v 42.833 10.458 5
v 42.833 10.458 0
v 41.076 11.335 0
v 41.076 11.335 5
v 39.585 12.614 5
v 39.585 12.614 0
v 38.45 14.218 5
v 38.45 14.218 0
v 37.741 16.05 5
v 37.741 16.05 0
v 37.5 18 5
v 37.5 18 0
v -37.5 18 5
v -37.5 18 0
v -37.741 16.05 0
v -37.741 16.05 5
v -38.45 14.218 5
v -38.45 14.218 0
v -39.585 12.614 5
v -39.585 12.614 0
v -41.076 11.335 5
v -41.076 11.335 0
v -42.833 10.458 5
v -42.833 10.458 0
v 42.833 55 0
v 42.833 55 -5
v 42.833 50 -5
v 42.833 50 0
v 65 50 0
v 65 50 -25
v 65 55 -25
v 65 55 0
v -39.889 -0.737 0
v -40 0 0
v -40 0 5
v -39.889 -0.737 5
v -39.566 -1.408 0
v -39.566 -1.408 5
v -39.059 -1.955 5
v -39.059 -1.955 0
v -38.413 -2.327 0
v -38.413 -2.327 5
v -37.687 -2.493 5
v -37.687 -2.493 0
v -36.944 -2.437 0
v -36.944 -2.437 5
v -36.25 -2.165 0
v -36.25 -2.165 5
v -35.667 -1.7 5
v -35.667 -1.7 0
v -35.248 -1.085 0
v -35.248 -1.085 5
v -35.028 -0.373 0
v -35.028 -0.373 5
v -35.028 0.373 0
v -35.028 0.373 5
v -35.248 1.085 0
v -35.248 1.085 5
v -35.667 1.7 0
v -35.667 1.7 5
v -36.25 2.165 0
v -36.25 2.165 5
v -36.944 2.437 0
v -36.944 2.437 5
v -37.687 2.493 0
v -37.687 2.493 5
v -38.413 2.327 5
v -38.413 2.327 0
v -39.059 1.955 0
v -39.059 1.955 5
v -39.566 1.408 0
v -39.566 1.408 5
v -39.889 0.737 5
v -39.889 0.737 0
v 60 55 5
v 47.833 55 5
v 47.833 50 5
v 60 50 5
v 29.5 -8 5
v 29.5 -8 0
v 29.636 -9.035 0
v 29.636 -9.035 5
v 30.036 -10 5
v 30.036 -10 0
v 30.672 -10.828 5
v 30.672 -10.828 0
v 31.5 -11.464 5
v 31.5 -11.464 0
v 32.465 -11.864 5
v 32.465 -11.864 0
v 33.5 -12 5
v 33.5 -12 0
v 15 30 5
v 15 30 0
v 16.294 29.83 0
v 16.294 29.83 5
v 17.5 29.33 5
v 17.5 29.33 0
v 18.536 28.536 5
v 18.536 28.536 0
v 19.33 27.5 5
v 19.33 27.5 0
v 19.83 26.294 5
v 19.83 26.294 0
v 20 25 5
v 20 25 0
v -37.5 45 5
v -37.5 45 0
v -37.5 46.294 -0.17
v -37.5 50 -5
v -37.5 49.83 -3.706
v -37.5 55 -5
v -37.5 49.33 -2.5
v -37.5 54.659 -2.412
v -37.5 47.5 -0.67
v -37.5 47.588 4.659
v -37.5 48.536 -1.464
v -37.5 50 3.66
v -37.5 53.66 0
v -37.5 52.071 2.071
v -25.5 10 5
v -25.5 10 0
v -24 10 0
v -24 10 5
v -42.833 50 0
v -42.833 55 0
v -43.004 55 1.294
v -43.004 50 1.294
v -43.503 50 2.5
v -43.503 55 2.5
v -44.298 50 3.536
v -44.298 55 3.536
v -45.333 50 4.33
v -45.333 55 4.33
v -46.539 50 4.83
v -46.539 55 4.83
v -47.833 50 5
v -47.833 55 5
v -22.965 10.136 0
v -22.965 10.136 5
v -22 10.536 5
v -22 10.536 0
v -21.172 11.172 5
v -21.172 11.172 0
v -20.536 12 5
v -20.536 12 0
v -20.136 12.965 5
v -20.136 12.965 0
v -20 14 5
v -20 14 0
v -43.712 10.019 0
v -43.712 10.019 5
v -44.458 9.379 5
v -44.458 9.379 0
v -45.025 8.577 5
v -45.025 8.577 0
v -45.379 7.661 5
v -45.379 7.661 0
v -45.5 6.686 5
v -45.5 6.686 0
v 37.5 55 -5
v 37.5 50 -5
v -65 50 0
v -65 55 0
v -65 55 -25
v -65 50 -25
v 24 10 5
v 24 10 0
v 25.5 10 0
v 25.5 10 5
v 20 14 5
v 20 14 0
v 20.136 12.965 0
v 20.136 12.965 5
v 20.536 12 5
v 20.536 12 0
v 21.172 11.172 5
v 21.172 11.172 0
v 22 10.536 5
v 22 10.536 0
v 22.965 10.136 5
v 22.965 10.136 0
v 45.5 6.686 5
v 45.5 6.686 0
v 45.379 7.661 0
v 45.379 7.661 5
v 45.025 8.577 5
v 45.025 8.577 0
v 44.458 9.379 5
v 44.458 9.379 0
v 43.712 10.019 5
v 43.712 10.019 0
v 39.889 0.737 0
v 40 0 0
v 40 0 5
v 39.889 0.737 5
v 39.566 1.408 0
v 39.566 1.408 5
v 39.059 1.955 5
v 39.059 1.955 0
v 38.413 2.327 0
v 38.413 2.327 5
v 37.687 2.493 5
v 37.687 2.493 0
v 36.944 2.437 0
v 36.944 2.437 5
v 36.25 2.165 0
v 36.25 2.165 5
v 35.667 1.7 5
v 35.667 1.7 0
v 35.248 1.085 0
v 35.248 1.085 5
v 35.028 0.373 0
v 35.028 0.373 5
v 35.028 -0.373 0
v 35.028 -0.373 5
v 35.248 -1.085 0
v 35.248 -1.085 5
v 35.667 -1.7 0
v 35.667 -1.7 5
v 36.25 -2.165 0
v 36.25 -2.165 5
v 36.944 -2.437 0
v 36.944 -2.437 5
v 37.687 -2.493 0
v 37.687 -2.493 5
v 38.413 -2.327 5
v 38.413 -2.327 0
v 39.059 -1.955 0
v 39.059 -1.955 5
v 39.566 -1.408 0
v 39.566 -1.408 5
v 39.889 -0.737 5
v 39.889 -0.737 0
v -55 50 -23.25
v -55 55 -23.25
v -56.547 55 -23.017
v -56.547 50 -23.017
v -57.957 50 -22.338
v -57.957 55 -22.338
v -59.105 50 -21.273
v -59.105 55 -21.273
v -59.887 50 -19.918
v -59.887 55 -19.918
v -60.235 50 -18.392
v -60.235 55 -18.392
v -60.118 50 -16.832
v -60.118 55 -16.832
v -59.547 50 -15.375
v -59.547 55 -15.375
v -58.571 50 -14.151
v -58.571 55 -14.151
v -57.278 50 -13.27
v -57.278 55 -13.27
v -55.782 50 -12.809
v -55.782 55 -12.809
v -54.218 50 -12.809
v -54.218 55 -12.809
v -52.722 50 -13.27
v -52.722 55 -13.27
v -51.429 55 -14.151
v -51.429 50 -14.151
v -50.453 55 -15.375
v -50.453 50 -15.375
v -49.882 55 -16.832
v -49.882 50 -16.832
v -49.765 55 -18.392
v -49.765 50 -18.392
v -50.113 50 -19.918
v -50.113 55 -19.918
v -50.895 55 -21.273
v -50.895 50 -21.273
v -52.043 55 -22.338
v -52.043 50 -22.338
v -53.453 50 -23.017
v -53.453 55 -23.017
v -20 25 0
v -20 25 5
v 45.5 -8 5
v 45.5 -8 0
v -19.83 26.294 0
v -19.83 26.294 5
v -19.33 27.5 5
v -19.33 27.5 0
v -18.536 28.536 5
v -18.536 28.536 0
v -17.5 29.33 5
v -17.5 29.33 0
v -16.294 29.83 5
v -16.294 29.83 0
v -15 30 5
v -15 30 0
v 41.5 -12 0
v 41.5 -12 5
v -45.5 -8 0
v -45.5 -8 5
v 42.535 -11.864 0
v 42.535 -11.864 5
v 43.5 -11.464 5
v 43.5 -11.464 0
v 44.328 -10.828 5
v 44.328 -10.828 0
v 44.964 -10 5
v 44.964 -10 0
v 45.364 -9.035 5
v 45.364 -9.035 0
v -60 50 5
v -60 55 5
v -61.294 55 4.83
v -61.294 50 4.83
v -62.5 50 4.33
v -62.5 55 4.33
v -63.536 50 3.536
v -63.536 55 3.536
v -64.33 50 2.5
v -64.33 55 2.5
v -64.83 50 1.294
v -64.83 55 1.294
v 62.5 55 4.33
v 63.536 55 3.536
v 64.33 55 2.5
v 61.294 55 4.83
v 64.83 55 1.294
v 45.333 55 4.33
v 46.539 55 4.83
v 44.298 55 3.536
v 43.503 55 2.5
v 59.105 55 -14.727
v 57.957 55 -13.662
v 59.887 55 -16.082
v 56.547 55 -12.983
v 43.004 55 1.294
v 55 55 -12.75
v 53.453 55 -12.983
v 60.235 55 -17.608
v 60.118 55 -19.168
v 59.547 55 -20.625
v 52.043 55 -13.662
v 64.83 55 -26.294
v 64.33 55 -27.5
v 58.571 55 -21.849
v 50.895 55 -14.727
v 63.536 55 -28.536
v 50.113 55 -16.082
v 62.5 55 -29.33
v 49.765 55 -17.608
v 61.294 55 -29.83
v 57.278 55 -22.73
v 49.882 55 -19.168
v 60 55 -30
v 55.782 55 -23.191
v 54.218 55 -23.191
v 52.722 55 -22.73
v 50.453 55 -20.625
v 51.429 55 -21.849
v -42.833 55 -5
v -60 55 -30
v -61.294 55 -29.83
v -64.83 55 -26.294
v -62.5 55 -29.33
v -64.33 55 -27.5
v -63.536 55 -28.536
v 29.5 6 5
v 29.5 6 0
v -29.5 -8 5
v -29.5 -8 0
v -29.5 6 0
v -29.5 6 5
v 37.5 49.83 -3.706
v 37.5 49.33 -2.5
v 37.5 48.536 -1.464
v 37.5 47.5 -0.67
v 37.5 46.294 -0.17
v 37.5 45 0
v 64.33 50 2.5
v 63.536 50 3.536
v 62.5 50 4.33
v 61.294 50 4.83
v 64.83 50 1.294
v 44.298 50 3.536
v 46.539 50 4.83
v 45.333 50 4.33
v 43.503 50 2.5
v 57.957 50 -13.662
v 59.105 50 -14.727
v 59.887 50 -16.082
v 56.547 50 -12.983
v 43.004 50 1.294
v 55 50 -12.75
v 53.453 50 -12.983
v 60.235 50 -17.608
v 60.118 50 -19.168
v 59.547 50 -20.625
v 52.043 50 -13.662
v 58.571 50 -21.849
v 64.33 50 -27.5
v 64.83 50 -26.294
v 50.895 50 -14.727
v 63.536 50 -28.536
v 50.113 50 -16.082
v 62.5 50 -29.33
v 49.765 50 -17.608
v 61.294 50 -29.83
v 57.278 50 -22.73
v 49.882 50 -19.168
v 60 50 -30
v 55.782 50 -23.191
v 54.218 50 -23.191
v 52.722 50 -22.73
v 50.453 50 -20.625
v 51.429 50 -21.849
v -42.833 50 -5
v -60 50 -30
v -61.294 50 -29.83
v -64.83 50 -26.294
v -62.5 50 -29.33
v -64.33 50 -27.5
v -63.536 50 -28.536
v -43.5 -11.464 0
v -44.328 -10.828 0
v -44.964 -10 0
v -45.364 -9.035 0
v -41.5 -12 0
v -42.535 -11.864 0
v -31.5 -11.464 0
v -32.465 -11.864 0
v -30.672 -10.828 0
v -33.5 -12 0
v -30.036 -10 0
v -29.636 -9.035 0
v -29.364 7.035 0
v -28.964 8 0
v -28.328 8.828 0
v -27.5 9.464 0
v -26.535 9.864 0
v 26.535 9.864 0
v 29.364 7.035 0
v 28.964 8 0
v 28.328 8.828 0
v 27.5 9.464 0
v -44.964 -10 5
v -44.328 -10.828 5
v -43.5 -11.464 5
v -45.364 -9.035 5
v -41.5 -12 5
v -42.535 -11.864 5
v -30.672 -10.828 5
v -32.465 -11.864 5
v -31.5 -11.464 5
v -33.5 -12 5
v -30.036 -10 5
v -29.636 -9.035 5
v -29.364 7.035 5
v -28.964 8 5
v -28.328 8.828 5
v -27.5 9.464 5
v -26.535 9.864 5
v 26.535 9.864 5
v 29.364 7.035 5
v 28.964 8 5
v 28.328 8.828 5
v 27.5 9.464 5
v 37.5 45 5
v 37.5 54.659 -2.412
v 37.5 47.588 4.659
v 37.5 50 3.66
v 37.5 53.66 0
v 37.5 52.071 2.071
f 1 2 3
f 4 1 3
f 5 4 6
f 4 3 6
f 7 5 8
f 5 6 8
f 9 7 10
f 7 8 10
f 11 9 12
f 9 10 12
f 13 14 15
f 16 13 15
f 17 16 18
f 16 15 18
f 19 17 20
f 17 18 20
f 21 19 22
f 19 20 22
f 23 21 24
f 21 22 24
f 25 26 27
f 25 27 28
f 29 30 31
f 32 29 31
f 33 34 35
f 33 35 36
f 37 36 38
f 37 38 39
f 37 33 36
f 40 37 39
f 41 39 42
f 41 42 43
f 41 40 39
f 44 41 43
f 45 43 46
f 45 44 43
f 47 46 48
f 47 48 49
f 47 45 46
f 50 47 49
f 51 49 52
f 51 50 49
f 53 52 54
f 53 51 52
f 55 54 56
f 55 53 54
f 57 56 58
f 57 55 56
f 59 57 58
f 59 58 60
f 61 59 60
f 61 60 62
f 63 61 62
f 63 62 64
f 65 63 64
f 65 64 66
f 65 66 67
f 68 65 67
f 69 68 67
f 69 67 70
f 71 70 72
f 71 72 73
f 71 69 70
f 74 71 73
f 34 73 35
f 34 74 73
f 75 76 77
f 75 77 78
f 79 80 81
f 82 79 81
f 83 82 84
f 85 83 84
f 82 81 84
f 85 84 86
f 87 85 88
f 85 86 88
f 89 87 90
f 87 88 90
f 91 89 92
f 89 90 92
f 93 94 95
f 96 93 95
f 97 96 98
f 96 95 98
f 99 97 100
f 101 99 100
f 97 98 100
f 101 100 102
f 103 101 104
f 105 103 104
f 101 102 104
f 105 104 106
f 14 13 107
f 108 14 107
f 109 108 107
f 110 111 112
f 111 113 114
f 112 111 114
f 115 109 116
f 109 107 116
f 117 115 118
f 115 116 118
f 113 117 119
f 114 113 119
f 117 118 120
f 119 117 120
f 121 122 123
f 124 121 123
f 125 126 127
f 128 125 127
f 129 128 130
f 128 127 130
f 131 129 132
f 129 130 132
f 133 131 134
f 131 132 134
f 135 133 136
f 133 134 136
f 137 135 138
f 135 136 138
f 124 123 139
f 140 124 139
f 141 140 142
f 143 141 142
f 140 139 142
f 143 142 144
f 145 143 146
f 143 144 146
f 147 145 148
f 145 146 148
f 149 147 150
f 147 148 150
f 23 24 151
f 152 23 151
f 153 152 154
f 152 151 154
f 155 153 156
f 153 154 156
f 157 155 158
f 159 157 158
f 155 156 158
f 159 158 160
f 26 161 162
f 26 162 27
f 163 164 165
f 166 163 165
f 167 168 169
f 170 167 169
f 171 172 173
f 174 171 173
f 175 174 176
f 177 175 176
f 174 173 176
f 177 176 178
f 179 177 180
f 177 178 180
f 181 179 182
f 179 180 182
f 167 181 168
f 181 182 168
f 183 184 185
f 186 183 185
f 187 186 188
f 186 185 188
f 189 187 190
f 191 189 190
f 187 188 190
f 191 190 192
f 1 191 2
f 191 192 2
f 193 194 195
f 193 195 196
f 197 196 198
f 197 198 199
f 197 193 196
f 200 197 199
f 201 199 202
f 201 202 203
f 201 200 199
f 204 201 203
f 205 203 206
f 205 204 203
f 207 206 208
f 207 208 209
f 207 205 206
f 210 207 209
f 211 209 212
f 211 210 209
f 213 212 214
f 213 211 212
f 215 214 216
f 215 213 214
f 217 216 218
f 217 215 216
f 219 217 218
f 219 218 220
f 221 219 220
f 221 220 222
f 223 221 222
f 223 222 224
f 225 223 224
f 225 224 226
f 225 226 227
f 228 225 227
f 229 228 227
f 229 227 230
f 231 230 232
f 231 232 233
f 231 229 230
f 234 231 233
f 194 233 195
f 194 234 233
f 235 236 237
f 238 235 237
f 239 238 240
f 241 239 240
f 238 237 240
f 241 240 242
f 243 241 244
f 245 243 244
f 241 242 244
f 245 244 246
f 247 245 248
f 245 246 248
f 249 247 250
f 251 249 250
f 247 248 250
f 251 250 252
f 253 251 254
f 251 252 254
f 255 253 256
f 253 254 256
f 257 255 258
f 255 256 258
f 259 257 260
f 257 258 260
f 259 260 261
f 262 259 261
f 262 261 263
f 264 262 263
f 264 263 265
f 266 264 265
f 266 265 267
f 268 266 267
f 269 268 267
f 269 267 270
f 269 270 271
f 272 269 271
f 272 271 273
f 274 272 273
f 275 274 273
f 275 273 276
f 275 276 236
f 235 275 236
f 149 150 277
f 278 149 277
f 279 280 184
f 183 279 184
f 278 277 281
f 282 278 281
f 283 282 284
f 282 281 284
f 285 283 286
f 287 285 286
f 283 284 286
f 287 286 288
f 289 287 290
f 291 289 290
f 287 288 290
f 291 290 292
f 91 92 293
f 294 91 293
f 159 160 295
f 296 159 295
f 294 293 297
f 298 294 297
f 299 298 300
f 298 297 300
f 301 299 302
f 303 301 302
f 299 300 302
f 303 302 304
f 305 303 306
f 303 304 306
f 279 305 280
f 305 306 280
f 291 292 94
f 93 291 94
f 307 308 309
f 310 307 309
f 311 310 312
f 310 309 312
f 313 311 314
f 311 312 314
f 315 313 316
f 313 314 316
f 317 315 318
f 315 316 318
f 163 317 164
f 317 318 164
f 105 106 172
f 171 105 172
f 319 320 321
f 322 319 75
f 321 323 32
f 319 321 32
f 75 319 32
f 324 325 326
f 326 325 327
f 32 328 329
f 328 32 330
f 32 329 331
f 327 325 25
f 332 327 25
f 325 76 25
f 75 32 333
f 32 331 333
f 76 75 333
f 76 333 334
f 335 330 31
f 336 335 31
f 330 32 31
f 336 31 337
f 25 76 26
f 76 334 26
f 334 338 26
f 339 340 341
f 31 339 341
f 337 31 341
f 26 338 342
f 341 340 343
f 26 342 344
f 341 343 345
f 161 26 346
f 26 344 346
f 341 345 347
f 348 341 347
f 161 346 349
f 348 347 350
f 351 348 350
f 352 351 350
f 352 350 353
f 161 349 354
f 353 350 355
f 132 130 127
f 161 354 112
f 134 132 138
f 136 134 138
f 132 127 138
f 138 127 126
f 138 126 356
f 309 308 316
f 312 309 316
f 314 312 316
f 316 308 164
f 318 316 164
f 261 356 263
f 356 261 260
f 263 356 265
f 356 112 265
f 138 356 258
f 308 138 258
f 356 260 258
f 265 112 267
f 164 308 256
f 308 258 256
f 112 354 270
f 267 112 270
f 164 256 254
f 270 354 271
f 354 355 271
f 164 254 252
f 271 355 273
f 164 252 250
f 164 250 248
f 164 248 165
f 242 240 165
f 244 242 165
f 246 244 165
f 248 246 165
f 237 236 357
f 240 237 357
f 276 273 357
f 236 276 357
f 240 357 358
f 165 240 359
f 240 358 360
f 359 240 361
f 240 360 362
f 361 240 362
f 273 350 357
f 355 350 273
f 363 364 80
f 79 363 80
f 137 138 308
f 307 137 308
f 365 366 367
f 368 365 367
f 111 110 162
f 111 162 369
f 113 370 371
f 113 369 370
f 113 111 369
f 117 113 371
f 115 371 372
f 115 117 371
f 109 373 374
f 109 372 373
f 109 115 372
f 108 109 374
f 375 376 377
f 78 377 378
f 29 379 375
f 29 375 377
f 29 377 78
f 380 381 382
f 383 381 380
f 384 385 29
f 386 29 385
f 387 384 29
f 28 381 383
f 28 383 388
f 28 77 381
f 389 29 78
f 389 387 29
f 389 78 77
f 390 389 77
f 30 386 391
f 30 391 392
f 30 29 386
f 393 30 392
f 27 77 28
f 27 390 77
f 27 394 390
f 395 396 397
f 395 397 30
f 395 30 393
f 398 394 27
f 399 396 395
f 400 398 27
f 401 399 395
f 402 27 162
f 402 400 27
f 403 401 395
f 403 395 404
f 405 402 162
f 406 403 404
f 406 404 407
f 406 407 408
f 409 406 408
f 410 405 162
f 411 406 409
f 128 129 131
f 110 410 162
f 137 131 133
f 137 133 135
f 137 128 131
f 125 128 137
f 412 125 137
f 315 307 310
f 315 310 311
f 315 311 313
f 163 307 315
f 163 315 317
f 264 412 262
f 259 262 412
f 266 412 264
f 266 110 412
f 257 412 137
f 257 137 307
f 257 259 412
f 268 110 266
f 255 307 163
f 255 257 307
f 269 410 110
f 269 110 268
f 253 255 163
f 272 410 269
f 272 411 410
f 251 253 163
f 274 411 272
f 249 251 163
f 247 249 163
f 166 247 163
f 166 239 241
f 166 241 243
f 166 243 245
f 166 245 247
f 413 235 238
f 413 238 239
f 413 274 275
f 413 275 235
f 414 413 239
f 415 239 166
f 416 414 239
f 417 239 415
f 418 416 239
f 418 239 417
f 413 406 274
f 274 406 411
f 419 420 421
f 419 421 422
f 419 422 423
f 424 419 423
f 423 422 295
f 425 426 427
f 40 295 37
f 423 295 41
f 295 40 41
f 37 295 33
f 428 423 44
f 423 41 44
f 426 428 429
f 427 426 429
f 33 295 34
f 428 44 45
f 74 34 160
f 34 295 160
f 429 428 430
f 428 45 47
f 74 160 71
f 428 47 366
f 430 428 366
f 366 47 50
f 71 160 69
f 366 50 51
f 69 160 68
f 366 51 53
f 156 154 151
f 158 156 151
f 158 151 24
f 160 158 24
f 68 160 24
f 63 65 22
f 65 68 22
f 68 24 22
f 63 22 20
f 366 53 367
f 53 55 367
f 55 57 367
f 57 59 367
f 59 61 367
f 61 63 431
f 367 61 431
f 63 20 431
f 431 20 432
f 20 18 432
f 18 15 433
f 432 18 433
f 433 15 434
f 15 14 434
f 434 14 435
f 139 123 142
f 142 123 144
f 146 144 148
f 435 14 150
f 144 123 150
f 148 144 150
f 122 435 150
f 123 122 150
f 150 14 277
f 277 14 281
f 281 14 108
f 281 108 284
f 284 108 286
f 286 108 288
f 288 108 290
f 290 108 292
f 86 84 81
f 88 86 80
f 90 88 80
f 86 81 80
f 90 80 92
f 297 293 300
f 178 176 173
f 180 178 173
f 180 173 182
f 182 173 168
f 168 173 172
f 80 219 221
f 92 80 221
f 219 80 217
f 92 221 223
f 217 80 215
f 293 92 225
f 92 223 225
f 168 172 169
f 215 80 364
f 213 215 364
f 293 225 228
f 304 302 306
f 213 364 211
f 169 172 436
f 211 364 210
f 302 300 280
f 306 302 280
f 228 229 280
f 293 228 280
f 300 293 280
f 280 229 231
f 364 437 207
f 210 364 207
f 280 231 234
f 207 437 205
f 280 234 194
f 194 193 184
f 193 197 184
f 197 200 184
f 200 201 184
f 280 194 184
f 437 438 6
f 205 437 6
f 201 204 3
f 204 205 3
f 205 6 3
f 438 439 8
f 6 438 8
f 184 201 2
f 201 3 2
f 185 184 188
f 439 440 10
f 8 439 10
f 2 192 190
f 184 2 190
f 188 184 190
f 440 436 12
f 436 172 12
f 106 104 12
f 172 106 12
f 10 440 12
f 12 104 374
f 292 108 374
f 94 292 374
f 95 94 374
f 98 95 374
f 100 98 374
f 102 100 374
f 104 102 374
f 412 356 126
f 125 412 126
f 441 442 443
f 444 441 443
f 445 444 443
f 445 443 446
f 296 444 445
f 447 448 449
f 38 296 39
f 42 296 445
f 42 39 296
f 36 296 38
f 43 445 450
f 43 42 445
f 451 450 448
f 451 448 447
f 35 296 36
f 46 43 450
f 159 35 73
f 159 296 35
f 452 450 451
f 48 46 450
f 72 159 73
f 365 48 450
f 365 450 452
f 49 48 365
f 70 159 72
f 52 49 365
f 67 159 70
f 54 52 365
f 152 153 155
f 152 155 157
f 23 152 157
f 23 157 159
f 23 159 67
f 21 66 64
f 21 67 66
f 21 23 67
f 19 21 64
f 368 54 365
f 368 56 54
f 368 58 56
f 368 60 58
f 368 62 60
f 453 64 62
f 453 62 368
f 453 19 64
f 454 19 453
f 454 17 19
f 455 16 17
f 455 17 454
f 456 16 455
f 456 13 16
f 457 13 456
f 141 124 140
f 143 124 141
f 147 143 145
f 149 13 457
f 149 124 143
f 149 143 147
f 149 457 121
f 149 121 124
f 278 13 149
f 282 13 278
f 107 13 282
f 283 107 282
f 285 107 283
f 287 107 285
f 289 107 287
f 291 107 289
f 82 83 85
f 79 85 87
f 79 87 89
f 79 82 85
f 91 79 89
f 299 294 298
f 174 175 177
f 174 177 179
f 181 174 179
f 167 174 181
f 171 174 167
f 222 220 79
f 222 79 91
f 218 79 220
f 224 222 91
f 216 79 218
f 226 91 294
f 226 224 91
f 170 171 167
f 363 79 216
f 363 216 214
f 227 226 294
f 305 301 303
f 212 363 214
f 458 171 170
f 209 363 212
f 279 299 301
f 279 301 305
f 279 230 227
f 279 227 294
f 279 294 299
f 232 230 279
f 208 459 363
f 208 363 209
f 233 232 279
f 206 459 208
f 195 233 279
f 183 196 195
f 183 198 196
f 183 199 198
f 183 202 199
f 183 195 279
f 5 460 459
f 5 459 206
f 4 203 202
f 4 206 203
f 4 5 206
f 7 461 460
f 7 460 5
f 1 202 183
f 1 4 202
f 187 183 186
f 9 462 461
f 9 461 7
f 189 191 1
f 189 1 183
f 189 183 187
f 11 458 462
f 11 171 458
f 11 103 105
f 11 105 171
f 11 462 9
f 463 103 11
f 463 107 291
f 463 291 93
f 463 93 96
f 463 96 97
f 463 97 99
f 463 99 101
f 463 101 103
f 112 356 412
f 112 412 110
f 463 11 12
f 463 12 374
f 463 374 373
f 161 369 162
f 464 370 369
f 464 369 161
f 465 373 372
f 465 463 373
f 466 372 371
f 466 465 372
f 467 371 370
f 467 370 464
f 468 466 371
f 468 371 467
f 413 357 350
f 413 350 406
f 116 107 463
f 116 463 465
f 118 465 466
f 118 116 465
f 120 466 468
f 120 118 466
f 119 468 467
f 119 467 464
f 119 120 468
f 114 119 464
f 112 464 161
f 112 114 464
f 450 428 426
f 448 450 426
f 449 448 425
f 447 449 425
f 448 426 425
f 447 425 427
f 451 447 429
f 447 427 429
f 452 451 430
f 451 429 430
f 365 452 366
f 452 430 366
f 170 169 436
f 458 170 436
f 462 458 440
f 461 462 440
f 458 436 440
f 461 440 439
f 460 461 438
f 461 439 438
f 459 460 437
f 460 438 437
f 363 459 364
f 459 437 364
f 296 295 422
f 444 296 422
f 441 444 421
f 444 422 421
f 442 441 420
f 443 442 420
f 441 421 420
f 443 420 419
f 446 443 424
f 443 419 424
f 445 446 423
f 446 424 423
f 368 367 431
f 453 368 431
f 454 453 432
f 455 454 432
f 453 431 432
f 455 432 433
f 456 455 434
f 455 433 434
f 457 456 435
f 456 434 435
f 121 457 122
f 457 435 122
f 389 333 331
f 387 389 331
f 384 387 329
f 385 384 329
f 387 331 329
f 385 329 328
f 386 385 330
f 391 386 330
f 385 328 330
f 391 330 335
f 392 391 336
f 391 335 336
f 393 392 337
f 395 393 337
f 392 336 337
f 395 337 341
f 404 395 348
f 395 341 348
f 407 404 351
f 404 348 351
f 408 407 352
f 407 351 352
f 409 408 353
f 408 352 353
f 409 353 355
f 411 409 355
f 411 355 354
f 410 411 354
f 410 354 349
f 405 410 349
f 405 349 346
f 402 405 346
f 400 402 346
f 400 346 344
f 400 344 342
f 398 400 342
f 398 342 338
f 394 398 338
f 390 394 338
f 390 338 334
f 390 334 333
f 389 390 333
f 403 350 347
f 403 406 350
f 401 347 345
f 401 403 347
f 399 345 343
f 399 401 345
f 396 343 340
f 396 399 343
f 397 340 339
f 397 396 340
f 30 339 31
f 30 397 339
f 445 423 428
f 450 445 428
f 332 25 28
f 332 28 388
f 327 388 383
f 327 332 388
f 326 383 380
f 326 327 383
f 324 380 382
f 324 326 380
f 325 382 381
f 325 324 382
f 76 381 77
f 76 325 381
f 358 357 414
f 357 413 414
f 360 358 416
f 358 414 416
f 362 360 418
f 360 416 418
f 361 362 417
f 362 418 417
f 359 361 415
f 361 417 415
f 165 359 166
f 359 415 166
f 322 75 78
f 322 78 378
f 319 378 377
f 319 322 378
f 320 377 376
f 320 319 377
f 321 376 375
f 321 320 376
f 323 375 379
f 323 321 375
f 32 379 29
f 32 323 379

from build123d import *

# Parameters (mm, degrees)
ESQUISSE1_R                           = 2.5
T_LE_DE_BASE_PLI_E1_DEPTH             = 5
T_LE_PLI_E_SUR_AR_TE1_STRIP_W         = 30
T_LE_PLI_E_SUR_AR_TE1_STRIP_H         = 5
T_LE_PLI_E_SUR_AR_TE1_STRIP_CUT_DEPTH = 130
T_LE_PLI_E_SUR_AR_TE1_DEPTH           = 130
CONG_1_R                              = 5
ESQUISSE7_R                           = 5.25
EXTRUSION2_DEPTH                      = 10
ESQUISSE8_W                           = 27.5
ESQUISSE8_H                           = 20
EXTRUSION3_DEPTH                      = 10
PATTE1_DEPTH                          = 5


# Sheet-metal steps are written as plain solids
with BuildPart() as part:
    # Esquisse1 → Tôle de base pliée1 (new body)
    with BuildSketch(Plane.XY):
        with BuildLine():
            Line((29.5, 6), (29.5, -8))
            ThreePointArc((29.5, -8), (30.671572875, -10.828427125), (33.5, -12))
            Line((33.5, -12), (41.5, -12))
            ThreePointArc((41.5, -12), (44.328427125, -10.828427125), (45.5, -8))
            Line((45.5, -8), (45.5, 6.686291501))
            ThreePointArc((45.5, 6.686291501), (44.765986324, 8.995692578), (42.833333333, 10.457527667))
            ThreePointArc((42.833333333, 10.457527667), (38.968027353, 13.381197846), (37.5, 18))
            Line((37.5, 18), (37.5, 35))
            ThreePointArc((37.5, 35), (40.428932188, 42.071067812), (47.5, 45))
            Line((47.5, 45), (65, 45))
            Line((65, 45), (65, 50))
            Line((65, 50), (-65, 50))
            Line((-65, 50), (-65, 45))
            Line((-65, 45), (-47.5, 45))
            ThreePointArc((-47.5, 45), (-40.428932188, 42.071067812), (-37.5, 35))
            Line((-37.5, 35), (-37.5, 18))
            ThreePointArc((-37.5, 18), (-38.968027353, 13.381197846), (-42.833333333, 10.457527667))
            ThreePointArc((-42.833333333, 10.457527667), (-44.765986324, 8.995692578), (-45.5, 6.686291501))
            Line((-45.5, 6.686291501), (-45.5, -8))
            ThreePointArc((-45.5, -8), (-44.328427125, -10.828427125), (-41.5, -12))
            Line((-41.5, -12), (-33.5, -12))
            ThreePointArc((-33.5, -12), (-30.671572875, -10.828427125), (-29.5, -8))
            Line((-29.5, -8), (-29.5, 6))
            ThreePointArc((-29.5, 6), (-28.328427125, 8.828427125), (-25.5, 10))
            Line((-25.5, 10), (-24, 10))
            ThreePointArc((-24, 10), (-21.171572875, 11.171572875), (-20, 14))
            Line((-20, 14), (-20, 25))
            ThreePointArc((-20, 25), (-18.535533906, 28.535533906), (-15, 30))
            Line((-15, 30), (15, 30))
            ThreePointArc((15, 30), (18.535533906, 28.535533906), (20, 25))
            Line((20, 25), (20, 14))
            ThreePointArc((20, 14), (21.171572875, 11.171572875), (24, 10))
            Line((24, 10), (25.5, 10))
            ThreePointArc((25.5, 10), (28.328427125, 8.828427125), (29.5, 6))
        make_face()
        with Locations((37.5, 0)):
            Circle(ESQUISSE1_R, mode=Mode.SUBTRACT)
        with Locations(Location((-37.5, 0, 0), (0, 0, 180))):
            Circle(ESQUISSE1_R, mode=Mode.SUBTRACT)
    extrude(amount=T_LE_DE_BASE_PLI_E1_DEPTH)

    # Tôle pliée sur arête1 strip (across the edge) → Tôle pliée sur arête1 strip cut (cut)
    with BuildSketch(Plane(origin=(-65, 50, 0), x_dir=(0, -1, 0), z_dir=(1, 0, 0))):
        with Locations((-10, -2.5)):
            Rectangle(T_LE_PLI_E_SUR_AR_TE1_STRIP_W, T_LE_PLI_E_SUR_AR_TE1_STRIP_H)
    extrude(amount=T_LE_PLI_E_SUR_AR_TE1_STRIP_CUT_DEPTH, mode=Mode.SUBTRACT)

    # Tôle pliée sur arête1 section (across the edge) → Tôle pliée sur arête1 (add)
    with BuildSketch(Plane(origin=(-65, 50, 0), x_dir=(0, -1, 0), z_dir=(1, 0, 0))):
        with BuildLine():
            Line((-5, 5), (-5, 30))
            Line((-5, 30), (0, 30))
            Line((0, 30), (0, 5))
            ThreePointArc((0, 5), (1.464466094, 1.464466094), (5, 0))
            Line((5, 0), (5, -5))
            ThreePointArc((5, -5), (-2.071067812, -2.071067812), (-5, 5))
        make_face()
    extrude(amount=T_LE_PLI_E_SUR_AR_TE1_DEPTH)

    # Congé1
    cong_1_edges = [part.edges().sort_by_distance(p)[0] for p in [
        (-65, 45, 2.5),
        (65, 45, 2.5),
        (-65, 52.5, -30),
        (65, 52.5, -30),
    ]]
    fillet(cong_1_edges, radius=CONG_1_R - 0.0001)  # a hair under: the kernel refuses the full size

    # Esquisse7 → Extrusion2 (cut)
    with BuildSketch(Plane(origin=(0, 55, 0), x_dir=(1, 0, 0), z_dir=(0, 1, 0))):
        with Locations(Location((55, 18, 0), (0, 0, 270))):
            Circle(ESQUISSE7_R)
        with Locations(Location((-55, 18, 0), (0, 0, 90))):
            Circle(ESQUISSE7_R)
    extrude(amount=-EXTRUSION2_DEPTH, mode=Mode.SUBTRACT)

    # Esquisse8 → Extrusion3 (cut)
    with BuildSketch(Plane.XY.offset(5)):
        with Locations((51.25, 45)):
            Rectangle(ESQUISSE8_W, ESQUISSE8_H)
        with Locations((-51.25, 45)):
            Rectangle(ESQUISSE8_W, ESQUISSE8_H)
    extrude(amount=-EXTRUSION3_DEPTH, mode=Mode.SUBTRACT)

    # Esquisse9 → Patte1 (add)
    with BuildSketch(Plane(origin=(0, 55, 0), x_dir=(1, 0, 0), z_dir=(0, 1, 0))):
        with BuildLine():
            Line((-65, 5), (-42.833333333, 5))
            Line((-42.833333333, 5), (-42.833333333, 0))
            ThreePointArc((-42.833333333, 0), (-44.297799427, -3.535533906), (-47.833333333, -5))
            Line((-47.833333333, -5), (-60, -5))
            ThreePointArc((-60, -5), (-63.535533906, -3.535533906), (-65, 0))
            Line((-65, 0), (-65, 5))
        make_face()
        with BuildLine():
            Line((65, 5), (42.833333333, 5))
            Line((42.833333333, 5), (42.833333333, 0))
            ThreePointArc((42.833333333, 0), (44.297799427, -3.535533906), (47.833333333, -5))
            Line((47.833333333, -5), (60, -5))
            ThreePointArc((60, -5), (63.535533906, -3.535533906), (65, 0))
            Line((65, 0), (65, 5))
        make_face()
    extrude(amount=-PATTE1_DEPTH)


solid = part.part
